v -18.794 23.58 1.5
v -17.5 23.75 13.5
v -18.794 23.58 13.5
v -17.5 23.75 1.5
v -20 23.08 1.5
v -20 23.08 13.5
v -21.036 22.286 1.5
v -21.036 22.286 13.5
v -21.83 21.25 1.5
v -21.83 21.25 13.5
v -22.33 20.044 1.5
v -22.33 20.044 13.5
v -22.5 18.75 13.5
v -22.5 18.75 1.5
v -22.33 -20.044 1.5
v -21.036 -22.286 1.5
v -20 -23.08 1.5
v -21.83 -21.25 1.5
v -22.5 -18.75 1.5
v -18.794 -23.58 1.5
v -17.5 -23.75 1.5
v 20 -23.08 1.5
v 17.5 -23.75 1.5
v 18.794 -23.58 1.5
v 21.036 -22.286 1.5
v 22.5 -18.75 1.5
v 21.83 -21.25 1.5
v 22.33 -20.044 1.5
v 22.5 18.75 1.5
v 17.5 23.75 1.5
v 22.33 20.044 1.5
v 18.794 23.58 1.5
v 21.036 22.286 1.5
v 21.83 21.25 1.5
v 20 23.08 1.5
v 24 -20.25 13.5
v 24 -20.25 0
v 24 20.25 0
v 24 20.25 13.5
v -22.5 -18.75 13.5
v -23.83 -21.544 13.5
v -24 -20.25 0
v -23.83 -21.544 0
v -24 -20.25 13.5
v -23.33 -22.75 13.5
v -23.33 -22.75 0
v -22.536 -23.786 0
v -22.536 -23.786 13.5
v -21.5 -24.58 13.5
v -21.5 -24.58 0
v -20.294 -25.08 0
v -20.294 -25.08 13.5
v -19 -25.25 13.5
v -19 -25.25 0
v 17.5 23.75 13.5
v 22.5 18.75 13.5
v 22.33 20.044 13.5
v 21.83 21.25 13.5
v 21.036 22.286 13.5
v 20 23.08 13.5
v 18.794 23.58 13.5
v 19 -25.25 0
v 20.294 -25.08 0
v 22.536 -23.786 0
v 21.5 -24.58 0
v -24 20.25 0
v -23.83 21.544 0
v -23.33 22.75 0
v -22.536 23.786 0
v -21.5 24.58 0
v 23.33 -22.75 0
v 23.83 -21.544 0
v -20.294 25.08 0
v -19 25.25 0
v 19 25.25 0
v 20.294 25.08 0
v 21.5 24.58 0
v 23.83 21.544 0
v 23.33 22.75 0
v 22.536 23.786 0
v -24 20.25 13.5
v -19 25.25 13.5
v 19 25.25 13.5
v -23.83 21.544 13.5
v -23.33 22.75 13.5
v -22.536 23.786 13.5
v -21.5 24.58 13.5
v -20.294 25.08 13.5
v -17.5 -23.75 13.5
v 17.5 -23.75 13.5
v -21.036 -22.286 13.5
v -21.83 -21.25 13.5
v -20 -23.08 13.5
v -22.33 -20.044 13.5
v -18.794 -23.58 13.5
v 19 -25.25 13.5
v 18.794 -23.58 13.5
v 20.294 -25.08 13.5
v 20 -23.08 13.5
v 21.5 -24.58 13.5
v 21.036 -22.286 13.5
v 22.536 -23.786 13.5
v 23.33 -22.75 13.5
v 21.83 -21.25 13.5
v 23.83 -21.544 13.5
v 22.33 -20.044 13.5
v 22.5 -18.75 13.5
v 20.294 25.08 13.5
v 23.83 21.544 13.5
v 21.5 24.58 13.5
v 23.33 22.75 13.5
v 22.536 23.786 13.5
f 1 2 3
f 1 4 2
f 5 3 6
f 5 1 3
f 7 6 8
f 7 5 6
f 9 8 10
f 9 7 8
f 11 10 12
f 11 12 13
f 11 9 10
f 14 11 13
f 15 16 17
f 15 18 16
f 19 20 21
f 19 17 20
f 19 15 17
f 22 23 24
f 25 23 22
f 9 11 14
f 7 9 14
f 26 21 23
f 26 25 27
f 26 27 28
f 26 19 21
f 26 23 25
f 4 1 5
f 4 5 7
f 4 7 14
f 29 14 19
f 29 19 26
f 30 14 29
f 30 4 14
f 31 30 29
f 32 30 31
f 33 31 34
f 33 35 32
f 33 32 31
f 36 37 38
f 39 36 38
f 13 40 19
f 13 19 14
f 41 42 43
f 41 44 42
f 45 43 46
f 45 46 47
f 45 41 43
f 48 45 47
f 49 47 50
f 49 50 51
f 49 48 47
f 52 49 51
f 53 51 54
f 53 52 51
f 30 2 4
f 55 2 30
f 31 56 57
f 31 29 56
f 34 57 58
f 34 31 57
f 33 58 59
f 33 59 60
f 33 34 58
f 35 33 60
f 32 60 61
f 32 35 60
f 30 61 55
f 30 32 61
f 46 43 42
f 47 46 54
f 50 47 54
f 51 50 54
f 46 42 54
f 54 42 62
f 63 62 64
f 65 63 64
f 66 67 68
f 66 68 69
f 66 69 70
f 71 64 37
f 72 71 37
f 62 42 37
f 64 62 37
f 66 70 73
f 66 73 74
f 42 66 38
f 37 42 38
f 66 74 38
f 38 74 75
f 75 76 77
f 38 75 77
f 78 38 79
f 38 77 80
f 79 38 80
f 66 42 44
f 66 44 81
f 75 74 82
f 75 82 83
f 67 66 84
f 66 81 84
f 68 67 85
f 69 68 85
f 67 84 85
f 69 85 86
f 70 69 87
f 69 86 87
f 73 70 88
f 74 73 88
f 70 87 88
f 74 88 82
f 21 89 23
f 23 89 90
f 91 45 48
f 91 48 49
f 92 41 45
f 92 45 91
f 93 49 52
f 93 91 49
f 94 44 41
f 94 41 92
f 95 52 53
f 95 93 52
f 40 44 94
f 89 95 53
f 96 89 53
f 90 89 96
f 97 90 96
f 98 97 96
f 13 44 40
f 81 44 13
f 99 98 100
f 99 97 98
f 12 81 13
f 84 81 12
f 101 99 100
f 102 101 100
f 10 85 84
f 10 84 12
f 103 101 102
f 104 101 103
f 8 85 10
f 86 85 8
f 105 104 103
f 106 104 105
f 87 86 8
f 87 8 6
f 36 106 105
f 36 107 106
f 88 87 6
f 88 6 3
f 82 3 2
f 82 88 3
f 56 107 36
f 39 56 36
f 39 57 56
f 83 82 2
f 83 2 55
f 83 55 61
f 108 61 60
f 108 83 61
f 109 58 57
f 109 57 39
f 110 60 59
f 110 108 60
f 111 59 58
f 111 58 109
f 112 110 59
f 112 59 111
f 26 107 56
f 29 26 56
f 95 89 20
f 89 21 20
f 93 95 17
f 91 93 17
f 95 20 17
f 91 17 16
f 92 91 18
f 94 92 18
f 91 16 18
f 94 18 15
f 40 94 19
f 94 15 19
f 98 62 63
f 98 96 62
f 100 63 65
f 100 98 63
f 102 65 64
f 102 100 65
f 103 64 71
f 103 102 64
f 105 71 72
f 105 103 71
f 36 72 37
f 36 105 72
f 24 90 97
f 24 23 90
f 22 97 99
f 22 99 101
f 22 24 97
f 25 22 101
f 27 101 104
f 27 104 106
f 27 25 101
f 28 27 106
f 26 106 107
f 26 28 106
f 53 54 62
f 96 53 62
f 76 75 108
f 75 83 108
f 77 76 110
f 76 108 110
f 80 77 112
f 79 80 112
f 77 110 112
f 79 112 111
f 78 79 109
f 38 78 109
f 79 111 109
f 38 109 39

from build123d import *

# Parameters (mm, degrees)
F0_W     = 48
F0_H     = 50.5
F1_DEPTH = 13.5
F2_W     = 45
F2_H     = 47.5
F3_DEPTH = 12
F4_R     = 5


with BuildPart() as f1:
    # F0 (on Top) → F1 (new body)
    with BuildSketch(Plane.XY):
        Rectangle(F0_W, F0_H)
    extrude(amount=F1_DEPTH)

    # F2 (on face) → F3 (cut)
    with BuildSketch(Plane.XY.offset(13.5)):
        Rectangle(F2_W, F2_H)
    extrude(amount=-F3_DEPTH, mode=Mode.SUBTRACT)

    # F4
    f4_edges = [f1.edges().sort_by_distance(p)[0] for p in [
        (22.5, 23.75, 7.5),
        (-22.5, 23.75, 7.5),
        (22.5, -23.75, 7.5),
        (-22.5, -23.75, 7.5),
        (-24, -25.25, 6.75),
        (24, -25.25, 6.75),
        (-24, 25.25, 6.75),
        (24, 25.25, 6.75),
    ]]
    fillet(f4_edges, radius=F4_R)


solid = f1.part
